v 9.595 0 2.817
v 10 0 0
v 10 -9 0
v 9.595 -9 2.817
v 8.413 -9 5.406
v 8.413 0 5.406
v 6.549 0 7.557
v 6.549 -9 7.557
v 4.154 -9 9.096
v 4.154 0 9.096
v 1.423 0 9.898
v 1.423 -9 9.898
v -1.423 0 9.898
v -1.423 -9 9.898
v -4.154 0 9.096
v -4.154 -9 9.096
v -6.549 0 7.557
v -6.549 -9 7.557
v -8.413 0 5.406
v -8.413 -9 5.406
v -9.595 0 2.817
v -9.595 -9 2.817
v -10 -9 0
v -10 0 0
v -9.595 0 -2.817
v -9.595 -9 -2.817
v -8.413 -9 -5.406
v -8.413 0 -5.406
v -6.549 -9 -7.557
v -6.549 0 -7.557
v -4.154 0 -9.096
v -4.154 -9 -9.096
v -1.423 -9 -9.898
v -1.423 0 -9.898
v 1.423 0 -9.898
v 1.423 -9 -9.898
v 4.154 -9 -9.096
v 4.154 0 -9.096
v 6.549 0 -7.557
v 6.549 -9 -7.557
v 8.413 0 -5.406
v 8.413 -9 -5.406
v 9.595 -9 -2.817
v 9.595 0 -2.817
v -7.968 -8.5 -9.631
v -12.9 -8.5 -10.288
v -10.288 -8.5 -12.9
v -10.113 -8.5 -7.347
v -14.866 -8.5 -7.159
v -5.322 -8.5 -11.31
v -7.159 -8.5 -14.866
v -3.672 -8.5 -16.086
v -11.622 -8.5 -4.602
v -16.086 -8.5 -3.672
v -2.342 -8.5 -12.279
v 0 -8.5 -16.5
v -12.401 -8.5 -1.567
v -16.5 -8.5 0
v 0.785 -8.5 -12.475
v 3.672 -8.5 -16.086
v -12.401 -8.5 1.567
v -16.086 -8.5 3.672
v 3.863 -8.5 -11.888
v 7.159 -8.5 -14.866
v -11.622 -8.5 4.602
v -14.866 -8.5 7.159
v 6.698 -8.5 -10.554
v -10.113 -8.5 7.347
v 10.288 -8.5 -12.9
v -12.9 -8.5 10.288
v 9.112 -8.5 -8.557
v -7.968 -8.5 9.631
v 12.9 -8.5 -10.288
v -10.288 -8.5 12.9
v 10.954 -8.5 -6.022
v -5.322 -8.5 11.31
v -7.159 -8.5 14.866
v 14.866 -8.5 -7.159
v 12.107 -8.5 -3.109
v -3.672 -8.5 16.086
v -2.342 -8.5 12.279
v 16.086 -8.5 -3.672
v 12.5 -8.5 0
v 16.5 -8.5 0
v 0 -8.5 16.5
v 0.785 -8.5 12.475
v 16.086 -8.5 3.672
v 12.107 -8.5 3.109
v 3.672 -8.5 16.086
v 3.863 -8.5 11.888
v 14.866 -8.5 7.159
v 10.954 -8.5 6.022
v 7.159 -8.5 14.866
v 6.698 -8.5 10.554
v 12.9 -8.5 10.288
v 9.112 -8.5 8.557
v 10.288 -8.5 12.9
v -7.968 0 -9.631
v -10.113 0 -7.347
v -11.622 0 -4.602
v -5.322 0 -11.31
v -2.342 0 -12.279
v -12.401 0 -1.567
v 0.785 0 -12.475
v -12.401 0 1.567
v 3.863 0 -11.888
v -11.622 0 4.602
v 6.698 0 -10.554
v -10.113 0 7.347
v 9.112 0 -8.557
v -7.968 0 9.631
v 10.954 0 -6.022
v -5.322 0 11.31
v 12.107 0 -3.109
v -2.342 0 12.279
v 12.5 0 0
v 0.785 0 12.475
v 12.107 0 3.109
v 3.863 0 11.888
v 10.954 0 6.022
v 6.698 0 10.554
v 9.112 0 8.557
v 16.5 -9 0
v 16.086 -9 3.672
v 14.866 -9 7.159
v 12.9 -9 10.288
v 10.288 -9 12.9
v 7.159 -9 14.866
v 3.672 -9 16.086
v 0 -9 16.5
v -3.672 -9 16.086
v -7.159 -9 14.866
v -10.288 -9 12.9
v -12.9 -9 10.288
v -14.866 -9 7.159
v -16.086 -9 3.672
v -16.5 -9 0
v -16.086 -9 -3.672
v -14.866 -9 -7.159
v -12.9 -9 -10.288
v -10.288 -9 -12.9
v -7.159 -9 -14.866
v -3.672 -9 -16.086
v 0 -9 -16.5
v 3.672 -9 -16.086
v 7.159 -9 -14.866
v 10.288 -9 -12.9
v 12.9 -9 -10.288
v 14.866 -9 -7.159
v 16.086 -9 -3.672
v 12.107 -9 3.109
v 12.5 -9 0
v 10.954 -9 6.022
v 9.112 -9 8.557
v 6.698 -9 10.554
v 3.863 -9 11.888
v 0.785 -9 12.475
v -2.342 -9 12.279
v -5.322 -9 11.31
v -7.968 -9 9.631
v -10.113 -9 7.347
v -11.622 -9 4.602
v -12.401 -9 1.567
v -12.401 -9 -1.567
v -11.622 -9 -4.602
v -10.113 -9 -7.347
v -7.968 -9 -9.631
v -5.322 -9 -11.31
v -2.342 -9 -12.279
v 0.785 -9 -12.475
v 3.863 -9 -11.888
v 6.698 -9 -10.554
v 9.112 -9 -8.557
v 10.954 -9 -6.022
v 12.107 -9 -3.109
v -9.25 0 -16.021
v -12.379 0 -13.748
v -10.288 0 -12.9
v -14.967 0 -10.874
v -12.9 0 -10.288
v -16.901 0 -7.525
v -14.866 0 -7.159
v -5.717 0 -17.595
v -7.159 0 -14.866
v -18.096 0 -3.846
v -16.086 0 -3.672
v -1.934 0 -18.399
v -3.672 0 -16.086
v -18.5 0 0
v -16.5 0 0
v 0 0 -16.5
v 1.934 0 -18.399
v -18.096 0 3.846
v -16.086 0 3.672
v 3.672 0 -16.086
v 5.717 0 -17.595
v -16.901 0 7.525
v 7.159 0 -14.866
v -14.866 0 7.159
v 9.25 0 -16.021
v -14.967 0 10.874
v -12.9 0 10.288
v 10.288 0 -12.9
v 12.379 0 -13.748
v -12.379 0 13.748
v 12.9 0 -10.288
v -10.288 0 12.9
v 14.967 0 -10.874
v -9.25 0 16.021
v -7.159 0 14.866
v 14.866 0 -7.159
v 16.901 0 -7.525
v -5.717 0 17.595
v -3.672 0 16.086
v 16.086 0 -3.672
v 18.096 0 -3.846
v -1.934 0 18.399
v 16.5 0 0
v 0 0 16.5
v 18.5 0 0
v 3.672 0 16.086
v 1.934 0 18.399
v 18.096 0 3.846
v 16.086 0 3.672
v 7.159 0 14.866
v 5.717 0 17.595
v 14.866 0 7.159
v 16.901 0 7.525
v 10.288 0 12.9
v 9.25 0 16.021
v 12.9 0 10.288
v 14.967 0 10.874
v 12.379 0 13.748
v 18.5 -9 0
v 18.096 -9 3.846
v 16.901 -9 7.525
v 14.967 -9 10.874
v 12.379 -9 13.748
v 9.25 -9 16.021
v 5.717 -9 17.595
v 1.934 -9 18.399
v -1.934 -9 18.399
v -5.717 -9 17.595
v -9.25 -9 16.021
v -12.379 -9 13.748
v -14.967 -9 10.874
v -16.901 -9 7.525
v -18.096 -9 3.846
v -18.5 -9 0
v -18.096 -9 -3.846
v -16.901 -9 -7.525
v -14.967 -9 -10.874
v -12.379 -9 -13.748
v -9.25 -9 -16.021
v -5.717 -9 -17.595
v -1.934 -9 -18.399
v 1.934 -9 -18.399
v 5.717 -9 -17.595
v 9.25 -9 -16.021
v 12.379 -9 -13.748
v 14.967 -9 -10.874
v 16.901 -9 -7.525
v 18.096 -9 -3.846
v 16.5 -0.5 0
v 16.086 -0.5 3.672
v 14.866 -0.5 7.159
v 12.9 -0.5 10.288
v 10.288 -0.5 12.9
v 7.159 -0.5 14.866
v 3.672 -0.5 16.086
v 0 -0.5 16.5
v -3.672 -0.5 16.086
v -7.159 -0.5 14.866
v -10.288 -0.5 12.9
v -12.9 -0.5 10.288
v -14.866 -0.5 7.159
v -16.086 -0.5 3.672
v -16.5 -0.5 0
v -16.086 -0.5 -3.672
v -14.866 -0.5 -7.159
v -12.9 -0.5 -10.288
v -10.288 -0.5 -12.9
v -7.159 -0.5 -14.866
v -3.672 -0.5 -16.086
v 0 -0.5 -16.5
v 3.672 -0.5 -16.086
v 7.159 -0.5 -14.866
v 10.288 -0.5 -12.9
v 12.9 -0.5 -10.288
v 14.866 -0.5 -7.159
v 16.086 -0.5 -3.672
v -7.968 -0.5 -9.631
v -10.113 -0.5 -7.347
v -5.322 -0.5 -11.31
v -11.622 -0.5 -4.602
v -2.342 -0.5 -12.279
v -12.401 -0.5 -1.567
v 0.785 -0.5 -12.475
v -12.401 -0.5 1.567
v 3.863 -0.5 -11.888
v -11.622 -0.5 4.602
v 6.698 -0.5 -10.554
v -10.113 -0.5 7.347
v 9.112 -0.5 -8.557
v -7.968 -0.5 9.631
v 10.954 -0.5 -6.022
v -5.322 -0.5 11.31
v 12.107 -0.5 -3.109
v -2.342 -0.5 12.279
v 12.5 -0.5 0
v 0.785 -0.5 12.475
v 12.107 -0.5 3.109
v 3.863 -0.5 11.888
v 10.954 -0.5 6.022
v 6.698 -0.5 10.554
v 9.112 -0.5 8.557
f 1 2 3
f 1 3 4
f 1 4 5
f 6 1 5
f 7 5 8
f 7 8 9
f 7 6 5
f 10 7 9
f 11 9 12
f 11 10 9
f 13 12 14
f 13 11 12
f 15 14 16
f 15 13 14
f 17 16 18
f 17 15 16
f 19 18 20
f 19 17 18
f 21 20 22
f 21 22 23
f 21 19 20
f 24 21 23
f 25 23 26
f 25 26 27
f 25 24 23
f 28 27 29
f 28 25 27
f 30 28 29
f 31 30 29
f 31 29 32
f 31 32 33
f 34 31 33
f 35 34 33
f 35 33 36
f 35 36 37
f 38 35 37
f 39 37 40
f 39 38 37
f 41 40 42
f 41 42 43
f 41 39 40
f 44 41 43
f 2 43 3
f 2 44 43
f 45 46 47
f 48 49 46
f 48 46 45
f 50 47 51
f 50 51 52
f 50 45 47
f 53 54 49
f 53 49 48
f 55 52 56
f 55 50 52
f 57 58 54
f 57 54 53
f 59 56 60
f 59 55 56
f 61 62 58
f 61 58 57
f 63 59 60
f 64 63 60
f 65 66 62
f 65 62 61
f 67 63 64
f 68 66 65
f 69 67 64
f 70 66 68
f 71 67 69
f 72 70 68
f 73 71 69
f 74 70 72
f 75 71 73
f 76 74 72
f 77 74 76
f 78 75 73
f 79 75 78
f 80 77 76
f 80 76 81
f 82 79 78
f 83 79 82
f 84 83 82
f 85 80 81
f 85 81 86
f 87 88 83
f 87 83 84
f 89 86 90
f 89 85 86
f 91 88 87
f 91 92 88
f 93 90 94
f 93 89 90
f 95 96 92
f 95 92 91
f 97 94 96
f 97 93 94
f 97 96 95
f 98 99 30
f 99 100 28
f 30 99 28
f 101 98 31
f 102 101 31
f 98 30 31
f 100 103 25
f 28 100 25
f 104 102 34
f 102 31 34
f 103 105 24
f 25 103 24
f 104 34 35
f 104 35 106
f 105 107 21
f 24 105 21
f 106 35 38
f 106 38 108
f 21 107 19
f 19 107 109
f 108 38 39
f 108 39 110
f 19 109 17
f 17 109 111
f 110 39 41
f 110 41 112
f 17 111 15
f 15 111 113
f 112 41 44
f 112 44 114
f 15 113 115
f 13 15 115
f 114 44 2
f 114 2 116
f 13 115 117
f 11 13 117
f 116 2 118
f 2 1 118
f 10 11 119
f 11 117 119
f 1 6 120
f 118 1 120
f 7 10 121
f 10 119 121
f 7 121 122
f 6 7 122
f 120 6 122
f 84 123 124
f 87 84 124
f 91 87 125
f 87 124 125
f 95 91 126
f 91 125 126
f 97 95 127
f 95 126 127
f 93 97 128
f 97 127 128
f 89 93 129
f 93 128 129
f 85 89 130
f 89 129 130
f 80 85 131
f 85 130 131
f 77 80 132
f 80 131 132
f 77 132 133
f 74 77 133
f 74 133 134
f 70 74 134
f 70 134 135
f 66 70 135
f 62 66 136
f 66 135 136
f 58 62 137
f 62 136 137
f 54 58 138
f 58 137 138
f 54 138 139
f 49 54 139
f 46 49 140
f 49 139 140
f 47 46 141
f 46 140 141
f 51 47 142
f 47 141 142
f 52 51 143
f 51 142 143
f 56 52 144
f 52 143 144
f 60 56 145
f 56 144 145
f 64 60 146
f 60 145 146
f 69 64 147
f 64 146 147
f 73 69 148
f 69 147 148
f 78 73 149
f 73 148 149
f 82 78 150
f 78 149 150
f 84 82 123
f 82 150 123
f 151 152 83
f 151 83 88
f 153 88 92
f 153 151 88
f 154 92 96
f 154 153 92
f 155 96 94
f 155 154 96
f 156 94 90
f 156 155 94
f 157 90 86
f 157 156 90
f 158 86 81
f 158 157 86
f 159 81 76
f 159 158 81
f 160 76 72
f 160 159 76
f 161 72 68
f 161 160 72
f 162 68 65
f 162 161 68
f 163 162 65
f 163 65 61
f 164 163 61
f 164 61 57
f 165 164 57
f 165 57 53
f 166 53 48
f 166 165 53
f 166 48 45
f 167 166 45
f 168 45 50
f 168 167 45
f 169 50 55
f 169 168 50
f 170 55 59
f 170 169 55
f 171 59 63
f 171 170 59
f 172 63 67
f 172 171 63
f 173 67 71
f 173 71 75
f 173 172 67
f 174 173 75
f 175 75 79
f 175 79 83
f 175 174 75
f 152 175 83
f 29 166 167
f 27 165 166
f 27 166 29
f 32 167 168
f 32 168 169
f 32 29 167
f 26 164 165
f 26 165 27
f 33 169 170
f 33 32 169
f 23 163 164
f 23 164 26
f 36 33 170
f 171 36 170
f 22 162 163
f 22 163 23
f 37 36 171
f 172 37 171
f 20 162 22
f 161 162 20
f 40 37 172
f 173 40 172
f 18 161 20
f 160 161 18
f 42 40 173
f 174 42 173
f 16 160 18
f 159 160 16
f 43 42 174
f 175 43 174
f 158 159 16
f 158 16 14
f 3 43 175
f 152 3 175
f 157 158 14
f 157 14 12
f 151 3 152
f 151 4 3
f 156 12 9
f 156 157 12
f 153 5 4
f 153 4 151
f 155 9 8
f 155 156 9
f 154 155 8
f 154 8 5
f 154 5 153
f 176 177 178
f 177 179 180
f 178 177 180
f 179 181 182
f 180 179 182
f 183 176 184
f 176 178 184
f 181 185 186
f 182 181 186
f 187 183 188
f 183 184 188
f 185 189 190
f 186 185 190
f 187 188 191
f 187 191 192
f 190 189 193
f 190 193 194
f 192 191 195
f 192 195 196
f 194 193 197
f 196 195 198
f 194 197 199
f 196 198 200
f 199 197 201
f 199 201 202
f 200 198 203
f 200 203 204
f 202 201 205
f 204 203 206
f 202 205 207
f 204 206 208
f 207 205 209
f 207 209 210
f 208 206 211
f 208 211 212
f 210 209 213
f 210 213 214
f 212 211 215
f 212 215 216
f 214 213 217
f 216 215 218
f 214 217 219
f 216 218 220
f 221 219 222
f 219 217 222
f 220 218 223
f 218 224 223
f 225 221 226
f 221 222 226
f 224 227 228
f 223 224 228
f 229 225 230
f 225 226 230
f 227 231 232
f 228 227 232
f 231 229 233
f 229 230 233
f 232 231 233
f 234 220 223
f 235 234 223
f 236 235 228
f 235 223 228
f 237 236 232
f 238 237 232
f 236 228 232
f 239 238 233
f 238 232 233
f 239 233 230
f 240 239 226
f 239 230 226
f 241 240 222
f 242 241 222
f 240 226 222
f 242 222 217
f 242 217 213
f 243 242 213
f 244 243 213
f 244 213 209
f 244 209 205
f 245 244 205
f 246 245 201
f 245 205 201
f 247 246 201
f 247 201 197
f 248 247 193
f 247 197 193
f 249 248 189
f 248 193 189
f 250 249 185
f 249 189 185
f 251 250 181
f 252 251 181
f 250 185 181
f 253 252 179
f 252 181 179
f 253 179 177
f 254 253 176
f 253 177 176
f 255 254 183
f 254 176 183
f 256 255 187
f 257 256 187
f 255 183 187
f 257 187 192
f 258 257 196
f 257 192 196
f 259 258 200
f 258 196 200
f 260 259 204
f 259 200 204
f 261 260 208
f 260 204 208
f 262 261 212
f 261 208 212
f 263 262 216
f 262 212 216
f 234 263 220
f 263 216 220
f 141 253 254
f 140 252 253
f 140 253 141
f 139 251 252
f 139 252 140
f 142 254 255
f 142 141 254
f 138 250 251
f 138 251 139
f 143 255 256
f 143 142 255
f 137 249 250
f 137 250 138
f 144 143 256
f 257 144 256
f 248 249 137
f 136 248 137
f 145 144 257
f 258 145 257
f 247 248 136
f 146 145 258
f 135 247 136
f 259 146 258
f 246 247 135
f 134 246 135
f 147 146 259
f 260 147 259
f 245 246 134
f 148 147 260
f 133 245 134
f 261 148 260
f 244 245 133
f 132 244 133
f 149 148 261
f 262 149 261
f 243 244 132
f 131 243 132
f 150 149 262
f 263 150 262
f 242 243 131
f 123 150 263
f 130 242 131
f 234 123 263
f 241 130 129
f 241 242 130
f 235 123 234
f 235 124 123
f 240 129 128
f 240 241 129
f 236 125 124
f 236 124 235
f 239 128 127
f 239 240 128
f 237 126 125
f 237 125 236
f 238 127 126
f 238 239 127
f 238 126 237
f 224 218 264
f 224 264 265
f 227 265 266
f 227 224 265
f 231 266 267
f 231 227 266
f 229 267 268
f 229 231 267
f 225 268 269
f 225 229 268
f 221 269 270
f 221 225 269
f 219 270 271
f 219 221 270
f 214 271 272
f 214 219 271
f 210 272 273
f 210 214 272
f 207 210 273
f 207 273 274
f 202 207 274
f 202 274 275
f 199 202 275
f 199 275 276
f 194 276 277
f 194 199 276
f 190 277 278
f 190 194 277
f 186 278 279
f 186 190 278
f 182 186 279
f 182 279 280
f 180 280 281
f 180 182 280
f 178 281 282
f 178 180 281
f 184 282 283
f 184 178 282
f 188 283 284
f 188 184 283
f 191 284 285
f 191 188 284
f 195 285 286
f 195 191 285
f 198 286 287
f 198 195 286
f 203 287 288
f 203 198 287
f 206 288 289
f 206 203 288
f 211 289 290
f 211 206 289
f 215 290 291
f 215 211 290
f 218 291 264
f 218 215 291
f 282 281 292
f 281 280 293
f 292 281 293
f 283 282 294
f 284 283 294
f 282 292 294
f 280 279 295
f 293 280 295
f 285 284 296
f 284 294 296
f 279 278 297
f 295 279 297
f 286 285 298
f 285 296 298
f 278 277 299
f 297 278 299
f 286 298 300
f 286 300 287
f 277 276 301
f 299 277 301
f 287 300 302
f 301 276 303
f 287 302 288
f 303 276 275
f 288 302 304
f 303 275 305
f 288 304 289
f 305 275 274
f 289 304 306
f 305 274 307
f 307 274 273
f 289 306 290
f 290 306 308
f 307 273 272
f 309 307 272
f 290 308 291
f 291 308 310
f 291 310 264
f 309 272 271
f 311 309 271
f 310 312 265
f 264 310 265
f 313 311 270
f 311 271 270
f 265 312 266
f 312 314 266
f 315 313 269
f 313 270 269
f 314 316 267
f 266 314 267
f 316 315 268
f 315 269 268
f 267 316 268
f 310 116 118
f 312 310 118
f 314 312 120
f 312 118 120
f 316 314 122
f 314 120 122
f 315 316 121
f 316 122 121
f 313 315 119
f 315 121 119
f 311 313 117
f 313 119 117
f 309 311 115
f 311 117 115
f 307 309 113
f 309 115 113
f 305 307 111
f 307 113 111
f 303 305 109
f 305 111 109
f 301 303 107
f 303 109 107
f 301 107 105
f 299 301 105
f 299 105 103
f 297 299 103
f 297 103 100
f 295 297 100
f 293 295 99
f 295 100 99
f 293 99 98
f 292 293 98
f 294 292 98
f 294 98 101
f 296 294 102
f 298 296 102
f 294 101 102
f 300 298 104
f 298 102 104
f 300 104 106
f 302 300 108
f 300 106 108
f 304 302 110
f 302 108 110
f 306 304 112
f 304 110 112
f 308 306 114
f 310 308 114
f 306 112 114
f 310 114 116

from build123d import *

# Parameters (mm, degrees)
F0_R     = 18.5
F0_R_2   = 10
F1_DEPTH = 9
F2_R     = 16.5
F2_R_2   = 12.5
F3_DEPTH = 0.5
F4_R     = 16.5
F4_R_2   = 12.5
F5_DEPTH = 0.5


with BuildPart() as f1:
    # F0 (on Front) → F1 (new body)
    with BuildSketch(Plane.XZ):
        Circle(F0_R)
        Circle(F0_R_2, mode=Mode.SUBTRACT)
    extrude(amount=F1_DEPTH)

    # F2 (on face) → F3 (cut)
    with BuildSketch(Plane.XZ.offset(9)):
        Circle(F2_R)
        Circle(F2_R_2, mode=Mode.SUBTRACT)
    extrude(amount=-F3_DEPTH, mode=Mode.SUBTRACT)

    # F4 (on Front) → F5 (cut)
    with BuildSketch(Plane.XZ):
        Circle(F4_R)
        Circle(F4_R_2, mode=Mode.SUBTRACT)
    extrude(amount=F5_DEPTH, mode=Mode.SUBTRACT)


solid = f1.part
